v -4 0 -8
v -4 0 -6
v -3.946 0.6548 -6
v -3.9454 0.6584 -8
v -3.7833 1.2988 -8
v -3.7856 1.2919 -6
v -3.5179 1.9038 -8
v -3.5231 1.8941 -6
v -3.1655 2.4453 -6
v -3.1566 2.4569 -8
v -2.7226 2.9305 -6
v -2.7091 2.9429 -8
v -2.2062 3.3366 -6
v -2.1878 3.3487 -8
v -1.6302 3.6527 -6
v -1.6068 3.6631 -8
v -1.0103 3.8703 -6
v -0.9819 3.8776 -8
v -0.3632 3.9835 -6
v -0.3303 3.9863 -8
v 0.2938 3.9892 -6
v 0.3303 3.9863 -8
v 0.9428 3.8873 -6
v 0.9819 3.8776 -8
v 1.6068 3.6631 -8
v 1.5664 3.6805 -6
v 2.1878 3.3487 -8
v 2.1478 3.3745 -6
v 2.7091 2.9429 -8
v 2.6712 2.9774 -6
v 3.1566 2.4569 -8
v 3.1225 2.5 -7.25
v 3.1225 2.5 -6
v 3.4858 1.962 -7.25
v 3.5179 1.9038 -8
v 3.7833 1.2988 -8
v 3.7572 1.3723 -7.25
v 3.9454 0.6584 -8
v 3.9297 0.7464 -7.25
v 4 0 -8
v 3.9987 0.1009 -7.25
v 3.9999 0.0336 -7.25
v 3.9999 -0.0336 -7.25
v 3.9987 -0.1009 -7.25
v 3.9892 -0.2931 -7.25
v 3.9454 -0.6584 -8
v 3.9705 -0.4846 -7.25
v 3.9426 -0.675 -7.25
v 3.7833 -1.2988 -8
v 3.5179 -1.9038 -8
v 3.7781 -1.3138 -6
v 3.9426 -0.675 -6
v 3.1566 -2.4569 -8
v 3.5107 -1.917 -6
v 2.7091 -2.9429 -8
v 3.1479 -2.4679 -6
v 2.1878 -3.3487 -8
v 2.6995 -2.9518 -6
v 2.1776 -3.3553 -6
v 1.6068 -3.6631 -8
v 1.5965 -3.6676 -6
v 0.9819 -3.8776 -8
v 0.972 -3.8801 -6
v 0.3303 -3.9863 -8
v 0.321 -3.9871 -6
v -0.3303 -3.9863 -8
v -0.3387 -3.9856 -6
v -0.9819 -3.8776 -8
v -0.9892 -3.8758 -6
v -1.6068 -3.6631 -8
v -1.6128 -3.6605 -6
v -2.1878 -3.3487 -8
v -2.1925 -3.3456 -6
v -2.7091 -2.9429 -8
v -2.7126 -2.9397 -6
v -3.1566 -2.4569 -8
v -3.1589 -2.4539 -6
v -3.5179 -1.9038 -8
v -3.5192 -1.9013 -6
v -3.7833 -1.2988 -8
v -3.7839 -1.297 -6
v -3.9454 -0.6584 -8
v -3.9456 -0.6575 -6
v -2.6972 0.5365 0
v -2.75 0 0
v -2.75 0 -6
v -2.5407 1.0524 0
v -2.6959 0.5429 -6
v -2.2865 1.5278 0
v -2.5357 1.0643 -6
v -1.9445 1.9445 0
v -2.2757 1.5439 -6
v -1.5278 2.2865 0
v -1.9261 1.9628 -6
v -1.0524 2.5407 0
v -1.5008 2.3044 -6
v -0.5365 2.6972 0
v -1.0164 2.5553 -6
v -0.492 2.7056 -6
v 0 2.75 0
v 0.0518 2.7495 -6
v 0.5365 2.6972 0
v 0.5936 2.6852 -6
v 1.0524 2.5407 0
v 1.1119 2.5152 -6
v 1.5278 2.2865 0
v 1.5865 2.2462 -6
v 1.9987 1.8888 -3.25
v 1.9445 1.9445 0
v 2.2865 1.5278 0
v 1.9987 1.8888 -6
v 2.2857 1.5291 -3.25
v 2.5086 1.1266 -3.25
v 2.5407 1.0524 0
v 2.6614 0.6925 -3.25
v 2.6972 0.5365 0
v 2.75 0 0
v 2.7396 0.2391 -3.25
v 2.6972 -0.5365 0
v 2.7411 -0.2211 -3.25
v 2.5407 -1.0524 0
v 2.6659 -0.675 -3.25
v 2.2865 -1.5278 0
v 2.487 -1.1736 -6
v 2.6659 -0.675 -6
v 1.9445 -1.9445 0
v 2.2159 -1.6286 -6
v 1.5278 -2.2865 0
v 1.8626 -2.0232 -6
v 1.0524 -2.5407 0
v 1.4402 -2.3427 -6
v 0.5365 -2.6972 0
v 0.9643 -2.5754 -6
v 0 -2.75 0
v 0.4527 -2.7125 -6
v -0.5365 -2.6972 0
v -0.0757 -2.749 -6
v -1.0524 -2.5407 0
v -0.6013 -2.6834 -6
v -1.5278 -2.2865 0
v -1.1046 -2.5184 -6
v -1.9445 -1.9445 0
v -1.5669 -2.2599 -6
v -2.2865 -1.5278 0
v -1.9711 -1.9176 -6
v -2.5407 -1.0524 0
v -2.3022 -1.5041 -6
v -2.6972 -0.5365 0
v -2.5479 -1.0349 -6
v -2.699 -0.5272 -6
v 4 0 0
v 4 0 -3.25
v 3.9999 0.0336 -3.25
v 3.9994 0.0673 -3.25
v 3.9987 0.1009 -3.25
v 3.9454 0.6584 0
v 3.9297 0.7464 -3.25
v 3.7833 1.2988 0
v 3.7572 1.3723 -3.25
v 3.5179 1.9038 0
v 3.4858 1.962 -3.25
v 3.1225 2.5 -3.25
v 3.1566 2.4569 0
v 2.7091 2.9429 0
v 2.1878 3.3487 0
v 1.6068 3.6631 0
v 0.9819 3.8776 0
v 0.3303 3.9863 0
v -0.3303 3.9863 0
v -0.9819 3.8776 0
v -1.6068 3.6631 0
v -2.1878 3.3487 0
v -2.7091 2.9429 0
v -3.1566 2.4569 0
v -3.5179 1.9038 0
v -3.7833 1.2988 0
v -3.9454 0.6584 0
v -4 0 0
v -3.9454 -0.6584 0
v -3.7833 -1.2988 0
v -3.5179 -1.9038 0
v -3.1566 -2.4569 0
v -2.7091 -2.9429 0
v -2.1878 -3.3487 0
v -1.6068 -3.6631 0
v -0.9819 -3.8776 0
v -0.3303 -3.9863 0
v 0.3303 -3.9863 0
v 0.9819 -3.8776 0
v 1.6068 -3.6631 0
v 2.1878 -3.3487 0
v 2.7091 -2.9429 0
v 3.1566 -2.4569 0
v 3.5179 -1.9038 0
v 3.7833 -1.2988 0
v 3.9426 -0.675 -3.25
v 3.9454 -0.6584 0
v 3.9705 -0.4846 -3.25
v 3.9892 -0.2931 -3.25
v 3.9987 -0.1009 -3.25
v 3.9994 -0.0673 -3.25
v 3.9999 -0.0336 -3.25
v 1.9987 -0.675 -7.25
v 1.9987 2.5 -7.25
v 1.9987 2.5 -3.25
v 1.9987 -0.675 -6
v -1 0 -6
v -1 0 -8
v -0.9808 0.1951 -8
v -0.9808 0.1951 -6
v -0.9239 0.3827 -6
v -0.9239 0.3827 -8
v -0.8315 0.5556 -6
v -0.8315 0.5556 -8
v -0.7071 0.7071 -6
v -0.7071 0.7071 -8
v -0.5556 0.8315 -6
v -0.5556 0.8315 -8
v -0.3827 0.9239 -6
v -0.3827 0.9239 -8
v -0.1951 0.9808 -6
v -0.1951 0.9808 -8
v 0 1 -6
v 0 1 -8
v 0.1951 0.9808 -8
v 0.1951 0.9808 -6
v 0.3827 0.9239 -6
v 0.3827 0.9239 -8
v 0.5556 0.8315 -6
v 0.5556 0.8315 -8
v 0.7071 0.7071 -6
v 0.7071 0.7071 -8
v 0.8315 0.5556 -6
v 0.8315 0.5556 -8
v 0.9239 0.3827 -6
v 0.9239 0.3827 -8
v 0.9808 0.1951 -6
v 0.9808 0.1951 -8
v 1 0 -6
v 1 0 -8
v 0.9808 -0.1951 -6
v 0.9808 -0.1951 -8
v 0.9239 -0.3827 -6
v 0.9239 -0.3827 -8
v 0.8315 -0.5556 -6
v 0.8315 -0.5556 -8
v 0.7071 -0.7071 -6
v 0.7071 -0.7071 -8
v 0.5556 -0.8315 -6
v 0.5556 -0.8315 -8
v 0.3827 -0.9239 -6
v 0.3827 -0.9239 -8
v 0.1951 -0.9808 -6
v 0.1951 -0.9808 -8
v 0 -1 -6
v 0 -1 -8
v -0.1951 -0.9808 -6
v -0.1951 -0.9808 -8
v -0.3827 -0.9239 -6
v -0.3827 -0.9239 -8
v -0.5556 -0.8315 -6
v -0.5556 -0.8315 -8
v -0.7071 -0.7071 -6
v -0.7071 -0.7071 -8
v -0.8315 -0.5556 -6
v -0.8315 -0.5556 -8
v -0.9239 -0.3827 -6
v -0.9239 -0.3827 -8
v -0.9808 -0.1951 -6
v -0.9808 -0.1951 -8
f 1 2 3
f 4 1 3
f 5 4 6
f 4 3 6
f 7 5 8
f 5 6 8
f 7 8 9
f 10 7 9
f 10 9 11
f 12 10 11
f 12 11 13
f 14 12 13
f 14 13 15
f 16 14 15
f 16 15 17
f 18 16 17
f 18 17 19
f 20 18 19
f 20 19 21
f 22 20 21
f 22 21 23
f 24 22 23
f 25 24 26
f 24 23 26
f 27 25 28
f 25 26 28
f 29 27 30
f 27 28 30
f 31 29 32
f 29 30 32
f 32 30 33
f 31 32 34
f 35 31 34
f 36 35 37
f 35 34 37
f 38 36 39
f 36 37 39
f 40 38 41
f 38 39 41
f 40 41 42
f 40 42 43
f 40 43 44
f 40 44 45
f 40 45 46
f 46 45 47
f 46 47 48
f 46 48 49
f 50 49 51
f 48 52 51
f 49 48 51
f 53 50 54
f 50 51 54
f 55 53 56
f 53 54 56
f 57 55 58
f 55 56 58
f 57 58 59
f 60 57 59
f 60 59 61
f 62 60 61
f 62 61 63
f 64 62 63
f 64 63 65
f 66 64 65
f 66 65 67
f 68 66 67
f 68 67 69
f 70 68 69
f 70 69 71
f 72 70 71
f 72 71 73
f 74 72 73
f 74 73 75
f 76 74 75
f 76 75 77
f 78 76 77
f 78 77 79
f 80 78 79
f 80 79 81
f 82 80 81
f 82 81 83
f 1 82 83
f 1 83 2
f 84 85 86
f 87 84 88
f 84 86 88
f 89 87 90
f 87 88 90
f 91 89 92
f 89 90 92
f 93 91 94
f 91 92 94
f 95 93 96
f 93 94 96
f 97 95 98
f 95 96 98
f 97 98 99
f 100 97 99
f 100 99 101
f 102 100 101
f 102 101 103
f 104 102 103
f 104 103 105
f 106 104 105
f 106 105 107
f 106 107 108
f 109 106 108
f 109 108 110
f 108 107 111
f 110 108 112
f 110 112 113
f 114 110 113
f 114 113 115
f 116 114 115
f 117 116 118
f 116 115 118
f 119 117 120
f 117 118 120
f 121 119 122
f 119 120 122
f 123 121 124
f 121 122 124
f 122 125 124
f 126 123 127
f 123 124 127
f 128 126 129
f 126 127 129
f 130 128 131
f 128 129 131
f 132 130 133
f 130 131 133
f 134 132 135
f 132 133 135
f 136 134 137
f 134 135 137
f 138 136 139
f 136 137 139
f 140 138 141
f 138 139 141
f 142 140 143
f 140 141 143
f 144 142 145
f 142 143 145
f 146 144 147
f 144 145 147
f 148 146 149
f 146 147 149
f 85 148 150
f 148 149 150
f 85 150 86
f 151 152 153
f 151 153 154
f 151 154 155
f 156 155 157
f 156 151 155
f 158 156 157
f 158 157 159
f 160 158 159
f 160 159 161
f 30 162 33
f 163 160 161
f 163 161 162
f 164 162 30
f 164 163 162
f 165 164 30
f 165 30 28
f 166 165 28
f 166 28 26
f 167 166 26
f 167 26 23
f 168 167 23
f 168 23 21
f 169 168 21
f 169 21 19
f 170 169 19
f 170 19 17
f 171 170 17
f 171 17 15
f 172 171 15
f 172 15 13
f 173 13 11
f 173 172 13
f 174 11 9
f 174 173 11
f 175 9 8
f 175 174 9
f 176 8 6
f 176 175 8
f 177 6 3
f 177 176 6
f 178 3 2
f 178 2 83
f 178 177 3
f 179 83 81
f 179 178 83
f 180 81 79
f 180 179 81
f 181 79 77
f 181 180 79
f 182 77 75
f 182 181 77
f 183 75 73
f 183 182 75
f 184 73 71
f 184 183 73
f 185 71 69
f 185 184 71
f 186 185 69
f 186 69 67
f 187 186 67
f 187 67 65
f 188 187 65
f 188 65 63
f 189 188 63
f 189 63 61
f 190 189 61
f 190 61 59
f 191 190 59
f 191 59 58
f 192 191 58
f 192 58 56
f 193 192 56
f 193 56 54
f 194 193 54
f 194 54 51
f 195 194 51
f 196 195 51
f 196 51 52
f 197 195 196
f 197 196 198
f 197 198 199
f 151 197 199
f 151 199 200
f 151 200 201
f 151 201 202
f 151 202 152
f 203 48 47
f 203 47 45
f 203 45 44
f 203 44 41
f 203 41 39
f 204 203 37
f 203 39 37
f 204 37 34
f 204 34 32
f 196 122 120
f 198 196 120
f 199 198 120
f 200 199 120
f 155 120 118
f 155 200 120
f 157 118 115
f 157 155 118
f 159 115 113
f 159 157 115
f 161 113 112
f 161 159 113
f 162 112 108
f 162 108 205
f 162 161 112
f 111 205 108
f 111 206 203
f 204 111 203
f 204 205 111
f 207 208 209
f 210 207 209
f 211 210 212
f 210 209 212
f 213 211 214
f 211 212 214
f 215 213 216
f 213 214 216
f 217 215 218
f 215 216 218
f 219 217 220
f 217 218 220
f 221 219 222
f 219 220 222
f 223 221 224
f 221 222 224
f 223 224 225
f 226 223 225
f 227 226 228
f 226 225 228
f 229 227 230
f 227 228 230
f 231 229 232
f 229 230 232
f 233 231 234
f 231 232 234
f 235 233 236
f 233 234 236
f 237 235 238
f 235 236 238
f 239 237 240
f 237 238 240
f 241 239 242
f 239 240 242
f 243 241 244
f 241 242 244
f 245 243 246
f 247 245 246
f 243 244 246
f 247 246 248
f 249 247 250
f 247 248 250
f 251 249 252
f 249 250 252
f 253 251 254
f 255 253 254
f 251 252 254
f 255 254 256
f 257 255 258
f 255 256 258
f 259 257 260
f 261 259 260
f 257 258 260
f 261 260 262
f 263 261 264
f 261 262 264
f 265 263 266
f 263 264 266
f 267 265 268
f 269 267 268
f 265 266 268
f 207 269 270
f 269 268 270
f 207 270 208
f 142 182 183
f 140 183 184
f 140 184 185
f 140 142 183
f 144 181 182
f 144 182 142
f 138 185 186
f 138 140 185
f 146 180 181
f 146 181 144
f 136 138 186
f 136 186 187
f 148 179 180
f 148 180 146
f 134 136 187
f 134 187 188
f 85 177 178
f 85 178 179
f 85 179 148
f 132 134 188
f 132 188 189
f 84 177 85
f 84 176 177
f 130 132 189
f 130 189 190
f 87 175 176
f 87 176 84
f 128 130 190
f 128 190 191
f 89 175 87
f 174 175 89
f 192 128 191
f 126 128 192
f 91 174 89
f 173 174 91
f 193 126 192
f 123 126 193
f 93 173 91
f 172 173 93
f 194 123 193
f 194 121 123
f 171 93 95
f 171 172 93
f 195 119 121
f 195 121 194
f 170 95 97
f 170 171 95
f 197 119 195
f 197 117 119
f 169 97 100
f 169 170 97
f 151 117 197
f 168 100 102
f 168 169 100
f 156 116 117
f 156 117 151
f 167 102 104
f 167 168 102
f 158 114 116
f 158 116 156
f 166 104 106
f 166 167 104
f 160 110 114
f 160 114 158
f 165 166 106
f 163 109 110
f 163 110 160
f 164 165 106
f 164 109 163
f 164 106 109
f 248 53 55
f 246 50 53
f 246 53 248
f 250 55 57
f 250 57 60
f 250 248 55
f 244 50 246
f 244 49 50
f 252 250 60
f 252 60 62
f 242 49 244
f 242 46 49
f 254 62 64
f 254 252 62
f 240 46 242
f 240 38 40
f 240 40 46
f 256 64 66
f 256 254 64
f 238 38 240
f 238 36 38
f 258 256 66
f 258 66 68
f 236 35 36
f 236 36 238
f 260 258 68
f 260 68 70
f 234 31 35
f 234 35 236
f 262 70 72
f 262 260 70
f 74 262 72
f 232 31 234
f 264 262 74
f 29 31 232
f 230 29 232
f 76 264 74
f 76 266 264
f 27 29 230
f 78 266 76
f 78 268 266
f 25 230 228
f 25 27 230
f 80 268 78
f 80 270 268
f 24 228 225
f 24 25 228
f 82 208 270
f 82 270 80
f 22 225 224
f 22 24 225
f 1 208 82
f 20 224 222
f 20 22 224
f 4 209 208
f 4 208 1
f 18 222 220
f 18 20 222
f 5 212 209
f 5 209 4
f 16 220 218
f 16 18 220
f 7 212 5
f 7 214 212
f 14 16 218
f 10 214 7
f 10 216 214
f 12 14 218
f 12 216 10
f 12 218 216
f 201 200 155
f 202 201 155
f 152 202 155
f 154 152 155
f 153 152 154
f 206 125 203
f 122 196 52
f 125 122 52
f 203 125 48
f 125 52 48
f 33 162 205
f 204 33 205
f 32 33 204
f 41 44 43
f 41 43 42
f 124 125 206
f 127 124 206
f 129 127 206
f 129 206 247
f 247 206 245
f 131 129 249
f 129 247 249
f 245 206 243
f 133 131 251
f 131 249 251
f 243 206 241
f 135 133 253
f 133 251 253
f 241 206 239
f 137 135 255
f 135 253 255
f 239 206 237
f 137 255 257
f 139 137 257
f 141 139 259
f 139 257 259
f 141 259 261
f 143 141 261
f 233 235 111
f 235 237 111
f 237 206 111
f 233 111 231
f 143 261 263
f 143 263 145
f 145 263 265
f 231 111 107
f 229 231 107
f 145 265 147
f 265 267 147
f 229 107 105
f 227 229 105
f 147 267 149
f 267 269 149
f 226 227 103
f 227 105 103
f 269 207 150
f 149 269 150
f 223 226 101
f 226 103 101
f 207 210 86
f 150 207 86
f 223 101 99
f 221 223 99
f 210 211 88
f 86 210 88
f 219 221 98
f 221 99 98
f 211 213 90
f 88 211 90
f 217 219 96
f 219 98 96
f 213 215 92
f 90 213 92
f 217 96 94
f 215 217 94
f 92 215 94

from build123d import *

# Parameters (mm, degrees)
SKETCH1_R               = 4
BOSS_EXTRUDE1_DEPTH     = 6
SKETCH2_R               = 2.75
CUT_EXTRUDE1_DEPTH      = 6
SKETCH3_R               = 4
BOSS_EXTRUDE2_DEPTH     = 2
SKETCH4_R               = 1
CUT_EXTRUDE2_DEPTH      = 2
CUT_EXTRUDE8_DEPTH      = 2
CUT_EXTRUDE8_DEPTH_BACK = 2
SKETCH9_W               = 4
SKETCH9_H               = 3.175


with BuildPart() as part:
    # Sketch1 → Boss-Extrude1 (new body)
    with BuildSketch(Plane.XY):
        Circle(SKETCH1_R)
    extrude(amount=-BOSS_EXTRUDE1_DEPTH)

    # Sketch2 → Cut-Extrude1 (cut)
    with BuildSketch(Plane(origin=(0, 0, -6), x_dir=(-1, 0, 0), z_dir=(0, 0, -1))):
        Circle(SKETCH2_R)
    extrude(amount=-CUT_EXTRUDE1_DEPTH, mode=Mode.SUBTRACT)

    # Sketch3 → Boss-Extrude2 (add)
    with BuildSketch(Plane(origin=(0, 0, -6), x_dir=(-1, 0, 0), z_dir=(0, 0, -1))):
        Circle(SKETCH3_R)
    extrude(amount=BOSS_EXTRUDE2_DEPTH)

    # Sketch4 → Cut-Extrude2 (cut)
    with BuildSketch(Plane(origin=(0, 0, -8), x_dir=(-1, 0, 0), z_dir=(0, 0, -1))):
        Circle(SKETCH4_R)
    extrude(amount=-CUT_EXTRUDE2_DEPTH, mode=Mode.SUBTRACT)

    # Sketch9 → Cut-Extrude8 (cut, two sides: drawn at the far end of the back side and taken through both)
    with BuildSketch(Plane(origin=(3.998726485, 0, 0), x_dir=(0, 0, -1), z_dir=(1, 0, 0)).offset(-CUT_EXTRUDE8_DEPTH_BACK)):
        with Locations((5.25, 0.9125)):
            Rectangle(SKETCH9_W, SKETCH9_H)
    extrude(amount=CUT_EXTRUDE8_DEPTH + CUT_EXTRUDE8_DEPTH_BACK, mode=Mode.SUBTRACT)


solid = part.part
